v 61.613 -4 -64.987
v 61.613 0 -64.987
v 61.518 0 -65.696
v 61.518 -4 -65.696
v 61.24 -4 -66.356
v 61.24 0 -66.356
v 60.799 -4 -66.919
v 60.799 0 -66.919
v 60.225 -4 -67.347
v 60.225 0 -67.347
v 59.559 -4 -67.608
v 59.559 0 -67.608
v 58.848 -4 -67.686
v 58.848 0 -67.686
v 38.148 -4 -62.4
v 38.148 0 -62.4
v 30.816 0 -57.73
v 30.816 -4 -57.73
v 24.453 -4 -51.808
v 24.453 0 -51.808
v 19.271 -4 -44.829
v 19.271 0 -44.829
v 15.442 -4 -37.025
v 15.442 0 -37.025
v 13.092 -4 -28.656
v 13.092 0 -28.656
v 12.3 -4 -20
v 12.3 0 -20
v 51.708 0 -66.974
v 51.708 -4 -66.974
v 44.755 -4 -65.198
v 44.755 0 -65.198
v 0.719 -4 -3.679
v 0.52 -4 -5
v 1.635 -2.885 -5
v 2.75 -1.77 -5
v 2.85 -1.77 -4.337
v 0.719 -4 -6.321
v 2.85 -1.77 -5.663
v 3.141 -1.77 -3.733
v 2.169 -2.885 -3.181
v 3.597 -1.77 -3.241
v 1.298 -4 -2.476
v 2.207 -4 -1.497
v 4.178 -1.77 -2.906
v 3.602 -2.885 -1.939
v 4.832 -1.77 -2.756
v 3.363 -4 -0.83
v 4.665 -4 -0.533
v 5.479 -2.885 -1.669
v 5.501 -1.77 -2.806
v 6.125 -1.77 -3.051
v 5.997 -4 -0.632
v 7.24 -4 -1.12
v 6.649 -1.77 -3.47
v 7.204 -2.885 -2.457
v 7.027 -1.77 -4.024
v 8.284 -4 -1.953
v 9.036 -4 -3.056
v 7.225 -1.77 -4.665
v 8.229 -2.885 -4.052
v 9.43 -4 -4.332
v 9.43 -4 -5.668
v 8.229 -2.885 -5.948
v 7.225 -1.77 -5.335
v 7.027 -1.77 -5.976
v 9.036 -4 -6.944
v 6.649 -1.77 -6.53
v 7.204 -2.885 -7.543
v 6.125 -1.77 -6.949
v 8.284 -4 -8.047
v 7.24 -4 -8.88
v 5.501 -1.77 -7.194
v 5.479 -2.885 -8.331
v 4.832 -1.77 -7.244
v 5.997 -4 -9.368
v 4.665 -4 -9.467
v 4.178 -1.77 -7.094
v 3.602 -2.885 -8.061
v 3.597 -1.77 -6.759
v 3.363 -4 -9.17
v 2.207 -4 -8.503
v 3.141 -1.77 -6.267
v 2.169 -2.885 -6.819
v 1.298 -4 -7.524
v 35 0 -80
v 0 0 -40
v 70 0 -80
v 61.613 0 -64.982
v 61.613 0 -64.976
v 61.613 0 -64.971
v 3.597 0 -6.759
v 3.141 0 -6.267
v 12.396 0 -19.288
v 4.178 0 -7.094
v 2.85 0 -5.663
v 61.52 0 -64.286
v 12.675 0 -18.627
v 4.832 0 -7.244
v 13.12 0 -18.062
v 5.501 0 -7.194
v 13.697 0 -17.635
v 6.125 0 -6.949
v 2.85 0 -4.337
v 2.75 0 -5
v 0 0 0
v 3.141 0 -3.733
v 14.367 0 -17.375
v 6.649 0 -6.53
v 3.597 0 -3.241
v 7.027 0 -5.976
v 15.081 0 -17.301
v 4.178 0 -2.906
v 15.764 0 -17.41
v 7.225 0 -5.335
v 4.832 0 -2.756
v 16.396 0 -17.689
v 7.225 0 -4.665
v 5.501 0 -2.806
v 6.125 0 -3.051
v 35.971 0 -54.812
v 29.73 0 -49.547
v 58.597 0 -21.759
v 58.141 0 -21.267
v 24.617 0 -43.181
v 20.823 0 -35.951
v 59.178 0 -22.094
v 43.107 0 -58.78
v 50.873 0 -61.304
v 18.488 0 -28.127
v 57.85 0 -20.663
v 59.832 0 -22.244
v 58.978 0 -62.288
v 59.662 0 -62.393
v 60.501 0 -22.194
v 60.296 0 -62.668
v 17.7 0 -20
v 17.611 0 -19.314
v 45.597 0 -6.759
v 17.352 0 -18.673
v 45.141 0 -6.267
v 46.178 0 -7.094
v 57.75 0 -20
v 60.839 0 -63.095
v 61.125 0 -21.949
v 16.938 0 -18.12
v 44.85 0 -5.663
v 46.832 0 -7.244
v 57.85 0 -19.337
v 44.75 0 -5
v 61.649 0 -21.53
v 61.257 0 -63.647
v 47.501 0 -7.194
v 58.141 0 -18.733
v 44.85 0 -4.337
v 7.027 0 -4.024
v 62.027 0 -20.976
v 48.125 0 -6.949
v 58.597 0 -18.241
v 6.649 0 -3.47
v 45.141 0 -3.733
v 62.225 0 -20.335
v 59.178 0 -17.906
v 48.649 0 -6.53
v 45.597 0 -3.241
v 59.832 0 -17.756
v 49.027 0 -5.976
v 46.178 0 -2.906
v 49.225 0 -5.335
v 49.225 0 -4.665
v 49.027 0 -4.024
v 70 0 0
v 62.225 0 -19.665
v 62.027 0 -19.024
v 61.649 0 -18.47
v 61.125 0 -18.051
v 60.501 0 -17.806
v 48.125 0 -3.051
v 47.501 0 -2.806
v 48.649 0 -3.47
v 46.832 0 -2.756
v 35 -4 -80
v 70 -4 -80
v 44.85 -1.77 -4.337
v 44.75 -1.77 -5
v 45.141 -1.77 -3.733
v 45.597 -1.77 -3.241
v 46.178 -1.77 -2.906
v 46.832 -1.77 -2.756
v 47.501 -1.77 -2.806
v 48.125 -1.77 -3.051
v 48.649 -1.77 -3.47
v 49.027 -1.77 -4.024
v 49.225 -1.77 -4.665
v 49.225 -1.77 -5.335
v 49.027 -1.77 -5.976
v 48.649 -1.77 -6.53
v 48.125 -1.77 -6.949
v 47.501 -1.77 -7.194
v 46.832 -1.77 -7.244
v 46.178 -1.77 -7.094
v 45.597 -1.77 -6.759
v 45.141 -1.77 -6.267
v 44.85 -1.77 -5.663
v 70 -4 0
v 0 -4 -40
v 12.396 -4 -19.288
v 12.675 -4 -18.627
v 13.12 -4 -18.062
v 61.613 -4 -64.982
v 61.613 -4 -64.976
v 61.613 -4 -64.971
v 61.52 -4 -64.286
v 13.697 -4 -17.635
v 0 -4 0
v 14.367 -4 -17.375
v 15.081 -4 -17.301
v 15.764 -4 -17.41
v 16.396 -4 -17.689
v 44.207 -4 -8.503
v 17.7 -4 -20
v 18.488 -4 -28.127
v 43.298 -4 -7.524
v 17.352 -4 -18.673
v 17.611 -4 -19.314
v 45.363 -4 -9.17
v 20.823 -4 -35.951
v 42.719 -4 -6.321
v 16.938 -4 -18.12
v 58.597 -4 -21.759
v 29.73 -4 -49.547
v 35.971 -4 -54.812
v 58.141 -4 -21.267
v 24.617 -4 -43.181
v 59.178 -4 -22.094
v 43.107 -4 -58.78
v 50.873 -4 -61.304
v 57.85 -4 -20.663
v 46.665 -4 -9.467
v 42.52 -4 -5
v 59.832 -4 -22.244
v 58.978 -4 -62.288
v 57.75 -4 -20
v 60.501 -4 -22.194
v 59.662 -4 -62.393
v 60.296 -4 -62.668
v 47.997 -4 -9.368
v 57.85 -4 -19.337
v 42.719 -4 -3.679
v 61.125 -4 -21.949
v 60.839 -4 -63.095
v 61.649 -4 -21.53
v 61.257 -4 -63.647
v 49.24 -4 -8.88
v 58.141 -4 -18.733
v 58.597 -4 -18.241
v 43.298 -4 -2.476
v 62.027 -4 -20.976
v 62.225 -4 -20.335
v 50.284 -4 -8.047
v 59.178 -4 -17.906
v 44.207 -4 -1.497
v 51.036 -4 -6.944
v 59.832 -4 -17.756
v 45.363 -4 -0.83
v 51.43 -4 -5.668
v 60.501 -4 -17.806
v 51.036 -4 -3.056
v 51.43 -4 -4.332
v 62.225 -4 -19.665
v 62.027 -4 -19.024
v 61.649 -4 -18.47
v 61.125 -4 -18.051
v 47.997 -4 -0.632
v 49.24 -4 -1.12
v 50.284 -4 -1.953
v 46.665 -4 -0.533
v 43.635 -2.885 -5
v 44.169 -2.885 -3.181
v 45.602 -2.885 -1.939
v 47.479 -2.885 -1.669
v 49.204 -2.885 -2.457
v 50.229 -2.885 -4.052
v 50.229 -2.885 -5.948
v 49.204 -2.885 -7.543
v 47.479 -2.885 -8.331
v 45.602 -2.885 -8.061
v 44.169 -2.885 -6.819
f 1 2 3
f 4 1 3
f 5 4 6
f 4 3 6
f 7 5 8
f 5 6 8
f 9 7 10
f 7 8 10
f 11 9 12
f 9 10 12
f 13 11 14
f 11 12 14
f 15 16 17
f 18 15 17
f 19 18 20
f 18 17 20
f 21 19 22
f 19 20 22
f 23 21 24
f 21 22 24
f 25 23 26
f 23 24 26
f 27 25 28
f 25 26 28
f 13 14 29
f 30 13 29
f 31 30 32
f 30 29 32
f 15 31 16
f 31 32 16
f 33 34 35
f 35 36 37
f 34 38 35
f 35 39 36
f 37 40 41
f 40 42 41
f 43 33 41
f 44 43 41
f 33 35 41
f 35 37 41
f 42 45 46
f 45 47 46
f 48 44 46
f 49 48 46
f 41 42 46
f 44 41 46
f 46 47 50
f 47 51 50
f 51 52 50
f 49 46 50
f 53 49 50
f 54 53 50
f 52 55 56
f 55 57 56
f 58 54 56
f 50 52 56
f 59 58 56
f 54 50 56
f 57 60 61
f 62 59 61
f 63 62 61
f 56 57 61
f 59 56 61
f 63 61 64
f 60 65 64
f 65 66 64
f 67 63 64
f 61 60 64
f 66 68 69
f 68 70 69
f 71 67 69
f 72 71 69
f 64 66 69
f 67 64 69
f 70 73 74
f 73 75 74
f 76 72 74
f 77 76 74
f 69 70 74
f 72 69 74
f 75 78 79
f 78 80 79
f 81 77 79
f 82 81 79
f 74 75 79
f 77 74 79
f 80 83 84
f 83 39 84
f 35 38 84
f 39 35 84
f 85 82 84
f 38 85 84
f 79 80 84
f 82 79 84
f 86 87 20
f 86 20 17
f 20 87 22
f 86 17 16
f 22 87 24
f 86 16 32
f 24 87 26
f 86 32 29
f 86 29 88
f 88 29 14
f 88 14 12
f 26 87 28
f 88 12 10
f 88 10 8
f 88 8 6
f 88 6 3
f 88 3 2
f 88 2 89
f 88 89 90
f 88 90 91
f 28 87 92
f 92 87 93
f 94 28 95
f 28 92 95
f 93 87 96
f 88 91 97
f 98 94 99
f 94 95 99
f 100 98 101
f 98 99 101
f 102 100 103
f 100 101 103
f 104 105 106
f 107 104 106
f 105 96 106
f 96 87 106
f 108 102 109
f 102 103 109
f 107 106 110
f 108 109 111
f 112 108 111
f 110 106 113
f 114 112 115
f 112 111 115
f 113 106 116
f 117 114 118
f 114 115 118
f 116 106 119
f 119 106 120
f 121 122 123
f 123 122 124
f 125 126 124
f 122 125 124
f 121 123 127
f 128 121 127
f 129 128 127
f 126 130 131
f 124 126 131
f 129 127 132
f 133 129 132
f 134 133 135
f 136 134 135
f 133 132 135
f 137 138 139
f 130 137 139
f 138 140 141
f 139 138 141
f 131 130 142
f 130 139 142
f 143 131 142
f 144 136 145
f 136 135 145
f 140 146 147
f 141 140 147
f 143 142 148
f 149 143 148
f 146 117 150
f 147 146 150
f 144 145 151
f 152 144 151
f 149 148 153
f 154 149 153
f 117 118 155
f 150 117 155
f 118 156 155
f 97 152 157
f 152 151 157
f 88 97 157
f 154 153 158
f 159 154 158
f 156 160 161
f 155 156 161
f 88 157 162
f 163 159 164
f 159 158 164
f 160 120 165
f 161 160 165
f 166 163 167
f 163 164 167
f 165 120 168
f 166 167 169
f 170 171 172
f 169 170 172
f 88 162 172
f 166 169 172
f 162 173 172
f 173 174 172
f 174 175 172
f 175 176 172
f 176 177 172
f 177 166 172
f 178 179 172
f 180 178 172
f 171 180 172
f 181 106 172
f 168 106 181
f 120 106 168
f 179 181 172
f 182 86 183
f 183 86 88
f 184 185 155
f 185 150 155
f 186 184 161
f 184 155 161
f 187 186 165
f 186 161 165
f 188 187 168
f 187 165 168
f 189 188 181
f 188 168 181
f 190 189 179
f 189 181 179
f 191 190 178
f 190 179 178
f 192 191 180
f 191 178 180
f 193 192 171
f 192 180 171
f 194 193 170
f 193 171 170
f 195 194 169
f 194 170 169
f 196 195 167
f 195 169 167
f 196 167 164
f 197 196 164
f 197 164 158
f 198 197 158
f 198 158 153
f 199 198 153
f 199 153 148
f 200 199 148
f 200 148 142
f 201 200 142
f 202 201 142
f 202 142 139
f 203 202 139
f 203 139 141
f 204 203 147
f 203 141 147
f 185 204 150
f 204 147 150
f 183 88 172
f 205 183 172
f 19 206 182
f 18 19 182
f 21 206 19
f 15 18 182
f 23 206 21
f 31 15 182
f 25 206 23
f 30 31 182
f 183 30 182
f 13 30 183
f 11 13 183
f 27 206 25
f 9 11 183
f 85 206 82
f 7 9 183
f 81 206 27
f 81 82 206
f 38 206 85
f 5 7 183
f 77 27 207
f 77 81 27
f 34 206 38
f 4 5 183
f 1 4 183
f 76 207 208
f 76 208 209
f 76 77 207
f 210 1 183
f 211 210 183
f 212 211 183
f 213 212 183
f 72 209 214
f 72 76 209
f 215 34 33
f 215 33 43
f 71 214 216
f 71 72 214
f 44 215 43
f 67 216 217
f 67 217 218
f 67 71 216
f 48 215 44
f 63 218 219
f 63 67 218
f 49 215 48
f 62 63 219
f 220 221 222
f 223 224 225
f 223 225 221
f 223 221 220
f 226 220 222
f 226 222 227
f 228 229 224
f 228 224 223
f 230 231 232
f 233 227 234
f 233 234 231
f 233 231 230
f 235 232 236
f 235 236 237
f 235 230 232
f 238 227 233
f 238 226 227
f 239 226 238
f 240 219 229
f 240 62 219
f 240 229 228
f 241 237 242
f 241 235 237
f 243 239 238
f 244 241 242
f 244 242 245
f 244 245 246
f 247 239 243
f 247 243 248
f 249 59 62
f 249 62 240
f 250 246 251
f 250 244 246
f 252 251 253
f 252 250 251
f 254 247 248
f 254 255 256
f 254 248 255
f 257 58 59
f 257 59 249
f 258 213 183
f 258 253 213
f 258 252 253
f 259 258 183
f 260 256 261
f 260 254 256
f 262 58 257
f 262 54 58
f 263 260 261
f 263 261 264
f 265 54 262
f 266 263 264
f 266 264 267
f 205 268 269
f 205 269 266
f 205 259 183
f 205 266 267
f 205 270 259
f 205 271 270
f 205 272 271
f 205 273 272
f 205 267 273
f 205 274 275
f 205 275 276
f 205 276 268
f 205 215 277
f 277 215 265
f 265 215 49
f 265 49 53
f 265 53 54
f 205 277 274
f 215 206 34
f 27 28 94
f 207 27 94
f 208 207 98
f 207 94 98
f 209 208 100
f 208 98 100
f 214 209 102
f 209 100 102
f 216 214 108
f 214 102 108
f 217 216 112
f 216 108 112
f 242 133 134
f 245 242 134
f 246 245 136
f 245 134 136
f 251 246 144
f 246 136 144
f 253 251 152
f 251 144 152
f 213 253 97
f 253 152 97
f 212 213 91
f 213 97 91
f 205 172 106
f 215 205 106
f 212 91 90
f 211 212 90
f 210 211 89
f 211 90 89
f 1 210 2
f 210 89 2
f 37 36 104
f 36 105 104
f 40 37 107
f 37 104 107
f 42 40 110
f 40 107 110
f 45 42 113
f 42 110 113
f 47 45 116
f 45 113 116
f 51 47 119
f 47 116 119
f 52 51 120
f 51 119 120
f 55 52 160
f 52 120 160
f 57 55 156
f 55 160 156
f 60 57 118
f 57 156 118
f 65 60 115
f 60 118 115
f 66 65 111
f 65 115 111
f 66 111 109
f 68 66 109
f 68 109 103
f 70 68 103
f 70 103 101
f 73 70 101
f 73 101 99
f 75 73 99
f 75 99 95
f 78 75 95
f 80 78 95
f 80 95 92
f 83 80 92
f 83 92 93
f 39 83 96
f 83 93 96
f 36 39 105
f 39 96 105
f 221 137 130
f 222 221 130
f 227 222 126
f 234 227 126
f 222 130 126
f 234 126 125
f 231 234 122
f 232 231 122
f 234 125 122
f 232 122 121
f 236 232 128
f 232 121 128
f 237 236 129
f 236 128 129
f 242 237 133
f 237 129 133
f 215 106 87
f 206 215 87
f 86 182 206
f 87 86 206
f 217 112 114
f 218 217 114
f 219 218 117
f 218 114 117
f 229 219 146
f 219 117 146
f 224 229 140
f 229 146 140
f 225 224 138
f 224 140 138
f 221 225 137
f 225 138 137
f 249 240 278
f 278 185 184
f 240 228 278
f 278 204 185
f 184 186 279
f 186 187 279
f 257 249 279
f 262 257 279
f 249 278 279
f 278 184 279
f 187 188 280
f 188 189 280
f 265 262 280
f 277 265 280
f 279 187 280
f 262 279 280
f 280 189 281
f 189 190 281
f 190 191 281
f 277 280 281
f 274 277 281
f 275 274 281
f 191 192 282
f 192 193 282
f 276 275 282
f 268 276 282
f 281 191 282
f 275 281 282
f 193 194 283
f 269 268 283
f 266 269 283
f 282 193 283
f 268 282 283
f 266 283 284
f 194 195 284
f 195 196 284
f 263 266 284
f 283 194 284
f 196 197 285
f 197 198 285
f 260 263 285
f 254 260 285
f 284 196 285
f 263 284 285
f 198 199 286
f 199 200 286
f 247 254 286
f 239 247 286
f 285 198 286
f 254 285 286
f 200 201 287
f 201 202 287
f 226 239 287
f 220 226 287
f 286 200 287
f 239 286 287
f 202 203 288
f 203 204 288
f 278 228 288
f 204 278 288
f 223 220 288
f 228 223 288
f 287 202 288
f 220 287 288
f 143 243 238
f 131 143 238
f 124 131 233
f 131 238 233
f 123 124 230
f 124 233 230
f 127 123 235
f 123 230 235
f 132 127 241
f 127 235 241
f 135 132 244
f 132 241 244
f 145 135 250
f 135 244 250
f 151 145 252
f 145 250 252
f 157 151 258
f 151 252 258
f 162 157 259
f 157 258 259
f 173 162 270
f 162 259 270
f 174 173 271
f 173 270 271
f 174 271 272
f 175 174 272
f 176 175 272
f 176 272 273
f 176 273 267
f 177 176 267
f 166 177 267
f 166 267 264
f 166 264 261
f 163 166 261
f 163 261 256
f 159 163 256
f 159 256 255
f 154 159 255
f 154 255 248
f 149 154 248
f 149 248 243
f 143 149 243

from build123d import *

# Parameters (mm, degrees)
F1_DEPTH       = 4
F2_D           = 4.5
F4_D           = 4.5
F4_CSINK_D     = 8.96
F4_CSINK_ANGLE = 90
F6_DEPTH       = 25


with BuildPart() as f1:
    # F0 (on Front) → F1 (new body)
    with BuildSketch(Plane.XZ):
        Polygon((16.6953813087, 0), (0, 0), (0, -80), (70, -80), (70, 0), (19.6887112585, 0), align=None)
        with BuildLine():
            ThreePointArc((12.3, -20), (13.1196675826, -18.0623854873), (15.081, -17.3012152735))
            ThreePointArc((15.081, -17.3012152735), (16.9376145127, -18.1196675826), (17.7, -20))
            ThreePointArc((17.7, -20), (23.8821053394, -42.0178946606), (40.6214035596, -57.6))
            ThreePointArc((40.6214035596, -57.6), (49.5339421791, -60.9847731931), (58.9781220381, -62.2876550004))
            ThreePointArc((58.9781220381, -62.2876550004), (60.8394880813, -63.0952428188), (61.6128496753, -64.9710875555))
            ThreePointArc((61.6128496753, -64.9710875555), (61.6128842578, -64.9789772549), (61.6128957853, -64.9868670217))
            ThreePointArc((61.6128957853, -64.9868670217), (60.7988821475, -66.9189786751), (58.8476695324, -67.686079043))
            ThreePointArc((58.8476695324, -67.686079043), (48.1978496914, -66.2168718986), (38.1475401842, -62.4))
            ThreePointArc((38.1475401842, -62.4), (19.2713102763, -44.8286897237), (12.3, -20))
        make_face(mode=Mode.SUBTRACT)
    extrude(amount=F1_DEPTH)

    # F2 (through all)
    with Locations(Plane(origin=(0, 0, 0), x_dir=(1, 0, 0), z_dir=(0, 1, 0))):
        with Locations((60, 20)):
            Hole(F2_D / 2)

    # F4 (through all)
    with Locations(Plane.XZ.offset(4)):
        with Locations((5, -5), (47, -5)):
            CounterSinkHole(F4_D / 2, F4_CSINK_D / 2, counter_sink_angle=F4_CSINK_ANGLE)

    # F5 (on face) → F6 (cut)
    with BuildSketch(Plane.XZ.offset(4)):
        Polygon((35, -80), (0, -40), (0, -80), align=None)
    extrude(amount=-F6_DEPTH, mode=Mode.SUBTRACT)


solid = f1.part
